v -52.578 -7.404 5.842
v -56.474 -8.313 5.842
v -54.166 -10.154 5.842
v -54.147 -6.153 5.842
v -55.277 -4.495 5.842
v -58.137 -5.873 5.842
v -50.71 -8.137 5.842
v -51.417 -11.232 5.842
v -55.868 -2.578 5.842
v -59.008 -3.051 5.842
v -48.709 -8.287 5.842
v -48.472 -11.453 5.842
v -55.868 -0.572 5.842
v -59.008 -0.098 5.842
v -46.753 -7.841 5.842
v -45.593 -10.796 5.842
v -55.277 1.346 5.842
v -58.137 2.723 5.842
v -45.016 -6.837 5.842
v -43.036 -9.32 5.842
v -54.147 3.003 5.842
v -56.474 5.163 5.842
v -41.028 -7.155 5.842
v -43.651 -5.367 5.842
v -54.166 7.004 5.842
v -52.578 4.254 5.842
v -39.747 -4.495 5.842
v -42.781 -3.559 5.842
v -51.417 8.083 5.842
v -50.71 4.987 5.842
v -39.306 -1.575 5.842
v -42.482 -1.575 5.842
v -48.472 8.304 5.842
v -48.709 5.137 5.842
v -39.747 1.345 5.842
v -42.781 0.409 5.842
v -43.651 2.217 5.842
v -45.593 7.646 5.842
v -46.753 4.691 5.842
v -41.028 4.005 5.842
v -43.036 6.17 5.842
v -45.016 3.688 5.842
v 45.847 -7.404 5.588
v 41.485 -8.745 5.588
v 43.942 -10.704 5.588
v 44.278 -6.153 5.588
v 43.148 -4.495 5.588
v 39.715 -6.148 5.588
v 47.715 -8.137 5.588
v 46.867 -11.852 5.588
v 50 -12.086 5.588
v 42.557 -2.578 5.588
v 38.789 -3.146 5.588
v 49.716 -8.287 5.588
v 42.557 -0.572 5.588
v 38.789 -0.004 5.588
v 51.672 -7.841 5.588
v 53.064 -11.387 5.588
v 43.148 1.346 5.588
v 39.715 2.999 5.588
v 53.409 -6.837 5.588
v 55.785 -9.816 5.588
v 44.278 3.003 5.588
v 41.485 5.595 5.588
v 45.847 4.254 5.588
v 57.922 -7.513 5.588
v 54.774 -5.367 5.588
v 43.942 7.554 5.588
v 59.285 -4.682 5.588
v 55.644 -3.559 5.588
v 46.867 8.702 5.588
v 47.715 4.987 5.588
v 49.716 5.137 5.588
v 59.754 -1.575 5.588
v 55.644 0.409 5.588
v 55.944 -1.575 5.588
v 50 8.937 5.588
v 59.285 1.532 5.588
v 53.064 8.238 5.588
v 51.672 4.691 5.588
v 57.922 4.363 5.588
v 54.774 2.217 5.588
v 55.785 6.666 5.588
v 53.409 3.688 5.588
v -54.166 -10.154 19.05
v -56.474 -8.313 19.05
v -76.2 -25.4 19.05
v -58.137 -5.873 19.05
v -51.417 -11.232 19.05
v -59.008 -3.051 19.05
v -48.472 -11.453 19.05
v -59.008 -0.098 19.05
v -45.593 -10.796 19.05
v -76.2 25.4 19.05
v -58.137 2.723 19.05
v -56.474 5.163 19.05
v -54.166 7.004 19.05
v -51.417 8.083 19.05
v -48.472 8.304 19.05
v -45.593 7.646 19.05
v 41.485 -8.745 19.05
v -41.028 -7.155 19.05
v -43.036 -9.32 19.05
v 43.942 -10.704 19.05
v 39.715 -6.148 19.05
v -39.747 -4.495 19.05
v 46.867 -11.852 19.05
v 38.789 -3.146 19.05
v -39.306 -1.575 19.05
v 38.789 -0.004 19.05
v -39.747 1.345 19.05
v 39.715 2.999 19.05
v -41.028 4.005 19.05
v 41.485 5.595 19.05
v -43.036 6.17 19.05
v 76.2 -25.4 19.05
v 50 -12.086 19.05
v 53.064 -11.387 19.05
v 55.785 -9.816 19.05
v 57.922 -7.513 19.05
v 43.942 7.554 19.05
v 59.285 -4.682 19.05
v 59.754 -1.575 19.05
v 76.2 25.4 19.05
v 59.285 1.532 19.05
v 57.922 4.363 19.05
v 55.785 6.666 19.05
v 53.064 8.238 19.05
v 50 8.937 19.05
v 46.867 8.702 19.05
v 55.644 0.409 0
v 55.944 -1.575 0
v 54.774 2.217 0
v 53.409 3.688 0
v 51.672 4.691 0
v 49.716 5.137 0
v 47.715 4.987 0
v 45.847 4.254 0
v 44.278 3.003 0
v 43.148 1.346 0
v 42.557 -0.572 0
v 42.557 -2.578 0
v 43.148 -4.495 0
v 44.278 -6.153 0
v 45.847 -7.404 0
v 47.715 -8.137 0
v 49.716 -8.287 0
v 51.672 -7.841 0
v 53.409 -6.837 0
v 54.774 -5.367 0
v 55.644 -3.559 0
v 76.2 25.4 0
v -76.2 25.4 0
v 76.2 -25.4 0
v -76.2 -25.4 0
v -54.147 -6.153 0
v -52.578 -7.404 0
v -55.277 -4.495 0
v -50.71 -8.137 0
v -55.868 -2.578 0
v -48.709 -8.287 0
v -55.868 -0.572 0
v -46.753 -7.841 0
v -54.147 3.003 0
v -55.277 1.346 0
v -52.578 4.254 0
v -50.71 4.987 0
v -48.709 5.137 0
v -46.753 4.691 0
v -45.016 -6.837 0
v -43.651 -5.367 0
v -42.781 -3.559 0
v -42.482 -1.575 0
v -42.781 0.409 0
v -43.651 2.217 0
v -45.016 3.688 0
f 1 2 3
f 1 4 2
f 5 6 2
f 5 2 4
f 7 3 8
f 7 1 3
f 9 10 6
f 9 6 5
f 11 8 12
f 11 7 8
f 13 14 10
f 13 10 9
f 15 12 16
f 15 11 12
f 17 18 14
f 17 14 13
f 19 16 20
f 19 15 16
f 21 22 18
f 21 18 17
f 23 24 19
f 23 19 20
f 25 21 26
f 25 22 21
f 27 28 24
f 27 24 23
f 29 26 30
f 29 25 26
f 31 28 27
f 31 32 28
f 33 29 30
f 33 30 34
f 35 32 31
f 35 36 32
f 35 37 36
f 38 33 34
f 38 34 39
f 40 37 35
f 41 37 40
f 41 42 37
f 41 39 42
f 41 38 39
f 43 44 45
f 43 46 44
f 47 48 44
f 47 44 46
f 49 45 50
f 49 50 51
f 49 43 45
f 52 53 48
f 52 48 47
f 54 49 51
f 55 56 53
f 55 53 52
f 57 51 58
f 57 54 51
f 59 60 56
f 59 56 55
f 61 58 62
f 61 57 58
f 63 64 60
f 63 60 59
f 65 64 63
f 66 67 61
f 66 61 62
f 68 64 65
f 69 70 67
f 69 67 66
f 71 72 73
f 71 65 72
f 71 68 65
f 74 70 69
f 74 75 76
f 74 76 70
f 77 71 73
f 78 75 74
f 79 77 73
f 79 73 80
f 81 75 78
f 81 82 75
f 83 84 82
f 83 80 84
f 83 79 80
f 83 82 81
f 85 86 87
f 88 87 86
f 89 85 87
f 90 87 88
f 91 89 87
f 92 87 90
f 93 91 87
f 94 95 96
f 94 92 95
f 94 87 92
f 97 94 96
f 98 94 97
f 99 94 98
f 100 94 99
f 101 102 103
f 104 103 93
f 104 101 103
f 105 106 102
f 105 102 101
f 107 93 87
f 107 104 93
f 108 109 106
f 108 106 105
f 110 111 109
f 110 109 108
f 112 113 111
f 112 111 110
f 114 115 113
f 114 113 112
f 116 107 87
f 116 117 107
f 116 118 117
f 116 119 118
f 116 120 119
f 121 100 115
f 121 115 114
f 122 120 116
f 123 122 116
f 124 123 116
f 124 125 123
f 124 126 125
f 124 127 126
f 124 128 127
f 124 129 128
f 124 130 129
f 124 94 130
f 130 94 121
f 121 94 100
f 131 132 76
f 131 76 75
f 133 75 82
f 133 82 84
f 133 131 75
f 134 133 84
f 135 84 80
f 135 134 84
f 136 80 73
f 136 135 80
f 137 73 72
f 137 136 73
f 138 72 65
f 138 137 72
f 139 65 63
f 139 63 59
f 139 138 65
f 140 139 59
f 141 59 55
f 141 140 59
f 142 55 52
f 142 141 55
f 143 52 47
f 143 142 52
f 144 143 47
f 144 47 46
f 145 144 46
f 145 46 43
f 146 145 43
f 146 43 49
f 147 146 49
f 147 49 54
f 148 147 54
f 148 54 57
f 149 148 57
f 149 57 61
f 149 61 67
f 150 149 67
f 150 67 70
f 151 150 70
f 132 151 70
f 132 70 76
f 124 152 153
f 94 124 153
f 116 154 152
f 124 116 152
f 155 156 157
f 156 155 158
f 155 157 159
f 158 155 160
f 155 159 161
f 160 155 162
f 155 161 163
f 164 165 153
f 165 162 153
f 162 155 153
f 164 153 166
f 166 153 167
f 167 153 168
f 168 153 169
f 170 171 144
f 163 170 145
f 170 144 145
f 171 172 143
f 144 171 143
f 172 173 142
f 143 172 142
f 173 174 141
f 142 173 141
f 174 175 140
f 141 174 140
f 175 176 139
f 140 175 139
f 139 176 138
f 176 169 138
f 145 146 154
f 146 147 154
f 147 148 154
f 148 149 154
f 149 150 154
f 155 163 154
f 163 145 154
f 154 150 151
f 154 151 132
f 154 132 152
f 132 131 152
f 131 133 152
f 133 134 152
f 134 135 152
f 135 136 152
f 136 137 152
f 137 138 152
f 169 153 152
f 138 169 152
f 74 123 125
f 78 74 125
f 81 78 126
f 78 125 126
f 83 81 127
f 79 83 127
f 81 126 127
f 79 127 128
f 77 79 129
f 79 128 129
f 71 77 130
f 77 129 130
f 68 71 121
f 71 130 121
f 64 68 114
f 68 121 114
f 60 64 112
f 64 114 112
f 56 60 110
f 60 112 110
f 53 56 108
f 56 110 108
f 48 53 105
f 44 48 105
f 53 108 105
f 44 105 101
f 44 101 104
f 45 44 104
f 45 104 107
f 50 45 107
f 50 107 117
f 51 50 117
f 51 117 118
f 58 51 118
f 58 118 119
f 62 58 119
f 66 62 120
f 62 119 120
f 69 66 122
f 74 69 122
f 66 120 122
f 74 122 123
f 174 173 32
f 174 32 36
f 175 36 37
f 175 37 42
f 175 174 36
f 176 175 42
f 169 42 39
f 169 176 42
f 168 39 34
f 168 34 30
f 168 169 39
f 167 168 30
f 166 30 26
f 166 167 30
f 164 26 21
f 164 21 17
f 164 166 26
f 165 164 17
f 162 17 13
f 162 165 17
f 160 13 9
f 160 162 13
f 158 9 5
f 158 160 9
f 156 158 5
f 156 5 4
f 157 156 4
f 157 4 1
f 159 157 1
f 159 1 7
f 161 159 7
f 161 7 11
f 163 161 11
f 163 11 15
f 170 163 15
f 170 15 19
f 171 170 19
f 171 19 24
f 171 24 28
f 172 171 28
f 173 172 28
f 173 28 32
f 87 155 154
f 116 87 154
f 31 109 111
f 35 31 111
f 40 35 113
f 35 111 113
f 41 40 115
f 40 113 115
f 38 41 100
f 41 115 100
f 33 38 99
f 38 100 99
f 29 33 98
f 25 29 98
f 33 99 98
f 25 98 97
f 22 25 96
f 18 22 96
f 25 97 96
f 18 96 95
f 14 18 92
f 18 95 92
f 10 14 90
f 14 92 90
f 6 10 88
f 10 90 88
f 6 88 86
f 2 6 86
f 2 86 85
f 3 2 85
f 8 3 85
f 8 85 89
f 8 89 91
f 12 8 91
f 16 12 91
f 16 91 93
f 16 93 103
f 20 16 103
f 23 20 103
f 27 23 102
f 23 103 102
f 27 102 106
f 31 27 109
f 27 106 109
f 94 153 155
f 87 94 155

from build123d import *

# Parameters (mm, degrees)
F0_R     = 6.731
F1_DEPTH = 19.05
F2_R     = 9.906
F2_R_2   = 6.731
F3_DEPTH = 13.208
F4_R     = 10.541
F4_R_2   = 6.731
F5_DEPTH = 13.462


with BuildPart() as f1:
    # F0 (on Top) → F1 (new body)
    with BuildSketch(Plane.XY):
        Polygon((22.225, -25.4), (76.2, -25.4), (76.2, 25.4), (-76.2, 25.4), (-76.2, -25.4), align=None)
        with Locations((-49.2125, -1.5748)):
            Circle(F0_R, mode=Mode.SUBTRACT)
        with Locations((49.2125, -1.5748)):
            Circle(F0_R, mode=Mode.SUBTRACT)
    extrude(amount=F1_DEPTH)

    # F2 (on face) → F3 (cut)
    with BuildSketch(Plane.XY.offset(19.05)):
        with Locations((-49.2125, -1.5748)):
            Circle(F2_R)
        with Locations((-49.2125, -1.5748)):
            Circle(F2_R_2, mode=Mode.SUBTRACT)
    extrude(amount=-F3_DEPTH, mode=Mode.SUBTRACT)

    # F4 (on face) → F5 (cut)
    with BuildSketch(Plane.XY.offset(19.05)):
        with Locations((49.2125, -1.5748)):
            Circle(F4_R)
        with Locations((49.2125, -1.5748)):
            Circle(F4_R_2, mode=Mode.SUBTRACT)
    extrude(amount=-F5_DEPTH, mode=Mode.SUBTRACT)


solid = f1.part
